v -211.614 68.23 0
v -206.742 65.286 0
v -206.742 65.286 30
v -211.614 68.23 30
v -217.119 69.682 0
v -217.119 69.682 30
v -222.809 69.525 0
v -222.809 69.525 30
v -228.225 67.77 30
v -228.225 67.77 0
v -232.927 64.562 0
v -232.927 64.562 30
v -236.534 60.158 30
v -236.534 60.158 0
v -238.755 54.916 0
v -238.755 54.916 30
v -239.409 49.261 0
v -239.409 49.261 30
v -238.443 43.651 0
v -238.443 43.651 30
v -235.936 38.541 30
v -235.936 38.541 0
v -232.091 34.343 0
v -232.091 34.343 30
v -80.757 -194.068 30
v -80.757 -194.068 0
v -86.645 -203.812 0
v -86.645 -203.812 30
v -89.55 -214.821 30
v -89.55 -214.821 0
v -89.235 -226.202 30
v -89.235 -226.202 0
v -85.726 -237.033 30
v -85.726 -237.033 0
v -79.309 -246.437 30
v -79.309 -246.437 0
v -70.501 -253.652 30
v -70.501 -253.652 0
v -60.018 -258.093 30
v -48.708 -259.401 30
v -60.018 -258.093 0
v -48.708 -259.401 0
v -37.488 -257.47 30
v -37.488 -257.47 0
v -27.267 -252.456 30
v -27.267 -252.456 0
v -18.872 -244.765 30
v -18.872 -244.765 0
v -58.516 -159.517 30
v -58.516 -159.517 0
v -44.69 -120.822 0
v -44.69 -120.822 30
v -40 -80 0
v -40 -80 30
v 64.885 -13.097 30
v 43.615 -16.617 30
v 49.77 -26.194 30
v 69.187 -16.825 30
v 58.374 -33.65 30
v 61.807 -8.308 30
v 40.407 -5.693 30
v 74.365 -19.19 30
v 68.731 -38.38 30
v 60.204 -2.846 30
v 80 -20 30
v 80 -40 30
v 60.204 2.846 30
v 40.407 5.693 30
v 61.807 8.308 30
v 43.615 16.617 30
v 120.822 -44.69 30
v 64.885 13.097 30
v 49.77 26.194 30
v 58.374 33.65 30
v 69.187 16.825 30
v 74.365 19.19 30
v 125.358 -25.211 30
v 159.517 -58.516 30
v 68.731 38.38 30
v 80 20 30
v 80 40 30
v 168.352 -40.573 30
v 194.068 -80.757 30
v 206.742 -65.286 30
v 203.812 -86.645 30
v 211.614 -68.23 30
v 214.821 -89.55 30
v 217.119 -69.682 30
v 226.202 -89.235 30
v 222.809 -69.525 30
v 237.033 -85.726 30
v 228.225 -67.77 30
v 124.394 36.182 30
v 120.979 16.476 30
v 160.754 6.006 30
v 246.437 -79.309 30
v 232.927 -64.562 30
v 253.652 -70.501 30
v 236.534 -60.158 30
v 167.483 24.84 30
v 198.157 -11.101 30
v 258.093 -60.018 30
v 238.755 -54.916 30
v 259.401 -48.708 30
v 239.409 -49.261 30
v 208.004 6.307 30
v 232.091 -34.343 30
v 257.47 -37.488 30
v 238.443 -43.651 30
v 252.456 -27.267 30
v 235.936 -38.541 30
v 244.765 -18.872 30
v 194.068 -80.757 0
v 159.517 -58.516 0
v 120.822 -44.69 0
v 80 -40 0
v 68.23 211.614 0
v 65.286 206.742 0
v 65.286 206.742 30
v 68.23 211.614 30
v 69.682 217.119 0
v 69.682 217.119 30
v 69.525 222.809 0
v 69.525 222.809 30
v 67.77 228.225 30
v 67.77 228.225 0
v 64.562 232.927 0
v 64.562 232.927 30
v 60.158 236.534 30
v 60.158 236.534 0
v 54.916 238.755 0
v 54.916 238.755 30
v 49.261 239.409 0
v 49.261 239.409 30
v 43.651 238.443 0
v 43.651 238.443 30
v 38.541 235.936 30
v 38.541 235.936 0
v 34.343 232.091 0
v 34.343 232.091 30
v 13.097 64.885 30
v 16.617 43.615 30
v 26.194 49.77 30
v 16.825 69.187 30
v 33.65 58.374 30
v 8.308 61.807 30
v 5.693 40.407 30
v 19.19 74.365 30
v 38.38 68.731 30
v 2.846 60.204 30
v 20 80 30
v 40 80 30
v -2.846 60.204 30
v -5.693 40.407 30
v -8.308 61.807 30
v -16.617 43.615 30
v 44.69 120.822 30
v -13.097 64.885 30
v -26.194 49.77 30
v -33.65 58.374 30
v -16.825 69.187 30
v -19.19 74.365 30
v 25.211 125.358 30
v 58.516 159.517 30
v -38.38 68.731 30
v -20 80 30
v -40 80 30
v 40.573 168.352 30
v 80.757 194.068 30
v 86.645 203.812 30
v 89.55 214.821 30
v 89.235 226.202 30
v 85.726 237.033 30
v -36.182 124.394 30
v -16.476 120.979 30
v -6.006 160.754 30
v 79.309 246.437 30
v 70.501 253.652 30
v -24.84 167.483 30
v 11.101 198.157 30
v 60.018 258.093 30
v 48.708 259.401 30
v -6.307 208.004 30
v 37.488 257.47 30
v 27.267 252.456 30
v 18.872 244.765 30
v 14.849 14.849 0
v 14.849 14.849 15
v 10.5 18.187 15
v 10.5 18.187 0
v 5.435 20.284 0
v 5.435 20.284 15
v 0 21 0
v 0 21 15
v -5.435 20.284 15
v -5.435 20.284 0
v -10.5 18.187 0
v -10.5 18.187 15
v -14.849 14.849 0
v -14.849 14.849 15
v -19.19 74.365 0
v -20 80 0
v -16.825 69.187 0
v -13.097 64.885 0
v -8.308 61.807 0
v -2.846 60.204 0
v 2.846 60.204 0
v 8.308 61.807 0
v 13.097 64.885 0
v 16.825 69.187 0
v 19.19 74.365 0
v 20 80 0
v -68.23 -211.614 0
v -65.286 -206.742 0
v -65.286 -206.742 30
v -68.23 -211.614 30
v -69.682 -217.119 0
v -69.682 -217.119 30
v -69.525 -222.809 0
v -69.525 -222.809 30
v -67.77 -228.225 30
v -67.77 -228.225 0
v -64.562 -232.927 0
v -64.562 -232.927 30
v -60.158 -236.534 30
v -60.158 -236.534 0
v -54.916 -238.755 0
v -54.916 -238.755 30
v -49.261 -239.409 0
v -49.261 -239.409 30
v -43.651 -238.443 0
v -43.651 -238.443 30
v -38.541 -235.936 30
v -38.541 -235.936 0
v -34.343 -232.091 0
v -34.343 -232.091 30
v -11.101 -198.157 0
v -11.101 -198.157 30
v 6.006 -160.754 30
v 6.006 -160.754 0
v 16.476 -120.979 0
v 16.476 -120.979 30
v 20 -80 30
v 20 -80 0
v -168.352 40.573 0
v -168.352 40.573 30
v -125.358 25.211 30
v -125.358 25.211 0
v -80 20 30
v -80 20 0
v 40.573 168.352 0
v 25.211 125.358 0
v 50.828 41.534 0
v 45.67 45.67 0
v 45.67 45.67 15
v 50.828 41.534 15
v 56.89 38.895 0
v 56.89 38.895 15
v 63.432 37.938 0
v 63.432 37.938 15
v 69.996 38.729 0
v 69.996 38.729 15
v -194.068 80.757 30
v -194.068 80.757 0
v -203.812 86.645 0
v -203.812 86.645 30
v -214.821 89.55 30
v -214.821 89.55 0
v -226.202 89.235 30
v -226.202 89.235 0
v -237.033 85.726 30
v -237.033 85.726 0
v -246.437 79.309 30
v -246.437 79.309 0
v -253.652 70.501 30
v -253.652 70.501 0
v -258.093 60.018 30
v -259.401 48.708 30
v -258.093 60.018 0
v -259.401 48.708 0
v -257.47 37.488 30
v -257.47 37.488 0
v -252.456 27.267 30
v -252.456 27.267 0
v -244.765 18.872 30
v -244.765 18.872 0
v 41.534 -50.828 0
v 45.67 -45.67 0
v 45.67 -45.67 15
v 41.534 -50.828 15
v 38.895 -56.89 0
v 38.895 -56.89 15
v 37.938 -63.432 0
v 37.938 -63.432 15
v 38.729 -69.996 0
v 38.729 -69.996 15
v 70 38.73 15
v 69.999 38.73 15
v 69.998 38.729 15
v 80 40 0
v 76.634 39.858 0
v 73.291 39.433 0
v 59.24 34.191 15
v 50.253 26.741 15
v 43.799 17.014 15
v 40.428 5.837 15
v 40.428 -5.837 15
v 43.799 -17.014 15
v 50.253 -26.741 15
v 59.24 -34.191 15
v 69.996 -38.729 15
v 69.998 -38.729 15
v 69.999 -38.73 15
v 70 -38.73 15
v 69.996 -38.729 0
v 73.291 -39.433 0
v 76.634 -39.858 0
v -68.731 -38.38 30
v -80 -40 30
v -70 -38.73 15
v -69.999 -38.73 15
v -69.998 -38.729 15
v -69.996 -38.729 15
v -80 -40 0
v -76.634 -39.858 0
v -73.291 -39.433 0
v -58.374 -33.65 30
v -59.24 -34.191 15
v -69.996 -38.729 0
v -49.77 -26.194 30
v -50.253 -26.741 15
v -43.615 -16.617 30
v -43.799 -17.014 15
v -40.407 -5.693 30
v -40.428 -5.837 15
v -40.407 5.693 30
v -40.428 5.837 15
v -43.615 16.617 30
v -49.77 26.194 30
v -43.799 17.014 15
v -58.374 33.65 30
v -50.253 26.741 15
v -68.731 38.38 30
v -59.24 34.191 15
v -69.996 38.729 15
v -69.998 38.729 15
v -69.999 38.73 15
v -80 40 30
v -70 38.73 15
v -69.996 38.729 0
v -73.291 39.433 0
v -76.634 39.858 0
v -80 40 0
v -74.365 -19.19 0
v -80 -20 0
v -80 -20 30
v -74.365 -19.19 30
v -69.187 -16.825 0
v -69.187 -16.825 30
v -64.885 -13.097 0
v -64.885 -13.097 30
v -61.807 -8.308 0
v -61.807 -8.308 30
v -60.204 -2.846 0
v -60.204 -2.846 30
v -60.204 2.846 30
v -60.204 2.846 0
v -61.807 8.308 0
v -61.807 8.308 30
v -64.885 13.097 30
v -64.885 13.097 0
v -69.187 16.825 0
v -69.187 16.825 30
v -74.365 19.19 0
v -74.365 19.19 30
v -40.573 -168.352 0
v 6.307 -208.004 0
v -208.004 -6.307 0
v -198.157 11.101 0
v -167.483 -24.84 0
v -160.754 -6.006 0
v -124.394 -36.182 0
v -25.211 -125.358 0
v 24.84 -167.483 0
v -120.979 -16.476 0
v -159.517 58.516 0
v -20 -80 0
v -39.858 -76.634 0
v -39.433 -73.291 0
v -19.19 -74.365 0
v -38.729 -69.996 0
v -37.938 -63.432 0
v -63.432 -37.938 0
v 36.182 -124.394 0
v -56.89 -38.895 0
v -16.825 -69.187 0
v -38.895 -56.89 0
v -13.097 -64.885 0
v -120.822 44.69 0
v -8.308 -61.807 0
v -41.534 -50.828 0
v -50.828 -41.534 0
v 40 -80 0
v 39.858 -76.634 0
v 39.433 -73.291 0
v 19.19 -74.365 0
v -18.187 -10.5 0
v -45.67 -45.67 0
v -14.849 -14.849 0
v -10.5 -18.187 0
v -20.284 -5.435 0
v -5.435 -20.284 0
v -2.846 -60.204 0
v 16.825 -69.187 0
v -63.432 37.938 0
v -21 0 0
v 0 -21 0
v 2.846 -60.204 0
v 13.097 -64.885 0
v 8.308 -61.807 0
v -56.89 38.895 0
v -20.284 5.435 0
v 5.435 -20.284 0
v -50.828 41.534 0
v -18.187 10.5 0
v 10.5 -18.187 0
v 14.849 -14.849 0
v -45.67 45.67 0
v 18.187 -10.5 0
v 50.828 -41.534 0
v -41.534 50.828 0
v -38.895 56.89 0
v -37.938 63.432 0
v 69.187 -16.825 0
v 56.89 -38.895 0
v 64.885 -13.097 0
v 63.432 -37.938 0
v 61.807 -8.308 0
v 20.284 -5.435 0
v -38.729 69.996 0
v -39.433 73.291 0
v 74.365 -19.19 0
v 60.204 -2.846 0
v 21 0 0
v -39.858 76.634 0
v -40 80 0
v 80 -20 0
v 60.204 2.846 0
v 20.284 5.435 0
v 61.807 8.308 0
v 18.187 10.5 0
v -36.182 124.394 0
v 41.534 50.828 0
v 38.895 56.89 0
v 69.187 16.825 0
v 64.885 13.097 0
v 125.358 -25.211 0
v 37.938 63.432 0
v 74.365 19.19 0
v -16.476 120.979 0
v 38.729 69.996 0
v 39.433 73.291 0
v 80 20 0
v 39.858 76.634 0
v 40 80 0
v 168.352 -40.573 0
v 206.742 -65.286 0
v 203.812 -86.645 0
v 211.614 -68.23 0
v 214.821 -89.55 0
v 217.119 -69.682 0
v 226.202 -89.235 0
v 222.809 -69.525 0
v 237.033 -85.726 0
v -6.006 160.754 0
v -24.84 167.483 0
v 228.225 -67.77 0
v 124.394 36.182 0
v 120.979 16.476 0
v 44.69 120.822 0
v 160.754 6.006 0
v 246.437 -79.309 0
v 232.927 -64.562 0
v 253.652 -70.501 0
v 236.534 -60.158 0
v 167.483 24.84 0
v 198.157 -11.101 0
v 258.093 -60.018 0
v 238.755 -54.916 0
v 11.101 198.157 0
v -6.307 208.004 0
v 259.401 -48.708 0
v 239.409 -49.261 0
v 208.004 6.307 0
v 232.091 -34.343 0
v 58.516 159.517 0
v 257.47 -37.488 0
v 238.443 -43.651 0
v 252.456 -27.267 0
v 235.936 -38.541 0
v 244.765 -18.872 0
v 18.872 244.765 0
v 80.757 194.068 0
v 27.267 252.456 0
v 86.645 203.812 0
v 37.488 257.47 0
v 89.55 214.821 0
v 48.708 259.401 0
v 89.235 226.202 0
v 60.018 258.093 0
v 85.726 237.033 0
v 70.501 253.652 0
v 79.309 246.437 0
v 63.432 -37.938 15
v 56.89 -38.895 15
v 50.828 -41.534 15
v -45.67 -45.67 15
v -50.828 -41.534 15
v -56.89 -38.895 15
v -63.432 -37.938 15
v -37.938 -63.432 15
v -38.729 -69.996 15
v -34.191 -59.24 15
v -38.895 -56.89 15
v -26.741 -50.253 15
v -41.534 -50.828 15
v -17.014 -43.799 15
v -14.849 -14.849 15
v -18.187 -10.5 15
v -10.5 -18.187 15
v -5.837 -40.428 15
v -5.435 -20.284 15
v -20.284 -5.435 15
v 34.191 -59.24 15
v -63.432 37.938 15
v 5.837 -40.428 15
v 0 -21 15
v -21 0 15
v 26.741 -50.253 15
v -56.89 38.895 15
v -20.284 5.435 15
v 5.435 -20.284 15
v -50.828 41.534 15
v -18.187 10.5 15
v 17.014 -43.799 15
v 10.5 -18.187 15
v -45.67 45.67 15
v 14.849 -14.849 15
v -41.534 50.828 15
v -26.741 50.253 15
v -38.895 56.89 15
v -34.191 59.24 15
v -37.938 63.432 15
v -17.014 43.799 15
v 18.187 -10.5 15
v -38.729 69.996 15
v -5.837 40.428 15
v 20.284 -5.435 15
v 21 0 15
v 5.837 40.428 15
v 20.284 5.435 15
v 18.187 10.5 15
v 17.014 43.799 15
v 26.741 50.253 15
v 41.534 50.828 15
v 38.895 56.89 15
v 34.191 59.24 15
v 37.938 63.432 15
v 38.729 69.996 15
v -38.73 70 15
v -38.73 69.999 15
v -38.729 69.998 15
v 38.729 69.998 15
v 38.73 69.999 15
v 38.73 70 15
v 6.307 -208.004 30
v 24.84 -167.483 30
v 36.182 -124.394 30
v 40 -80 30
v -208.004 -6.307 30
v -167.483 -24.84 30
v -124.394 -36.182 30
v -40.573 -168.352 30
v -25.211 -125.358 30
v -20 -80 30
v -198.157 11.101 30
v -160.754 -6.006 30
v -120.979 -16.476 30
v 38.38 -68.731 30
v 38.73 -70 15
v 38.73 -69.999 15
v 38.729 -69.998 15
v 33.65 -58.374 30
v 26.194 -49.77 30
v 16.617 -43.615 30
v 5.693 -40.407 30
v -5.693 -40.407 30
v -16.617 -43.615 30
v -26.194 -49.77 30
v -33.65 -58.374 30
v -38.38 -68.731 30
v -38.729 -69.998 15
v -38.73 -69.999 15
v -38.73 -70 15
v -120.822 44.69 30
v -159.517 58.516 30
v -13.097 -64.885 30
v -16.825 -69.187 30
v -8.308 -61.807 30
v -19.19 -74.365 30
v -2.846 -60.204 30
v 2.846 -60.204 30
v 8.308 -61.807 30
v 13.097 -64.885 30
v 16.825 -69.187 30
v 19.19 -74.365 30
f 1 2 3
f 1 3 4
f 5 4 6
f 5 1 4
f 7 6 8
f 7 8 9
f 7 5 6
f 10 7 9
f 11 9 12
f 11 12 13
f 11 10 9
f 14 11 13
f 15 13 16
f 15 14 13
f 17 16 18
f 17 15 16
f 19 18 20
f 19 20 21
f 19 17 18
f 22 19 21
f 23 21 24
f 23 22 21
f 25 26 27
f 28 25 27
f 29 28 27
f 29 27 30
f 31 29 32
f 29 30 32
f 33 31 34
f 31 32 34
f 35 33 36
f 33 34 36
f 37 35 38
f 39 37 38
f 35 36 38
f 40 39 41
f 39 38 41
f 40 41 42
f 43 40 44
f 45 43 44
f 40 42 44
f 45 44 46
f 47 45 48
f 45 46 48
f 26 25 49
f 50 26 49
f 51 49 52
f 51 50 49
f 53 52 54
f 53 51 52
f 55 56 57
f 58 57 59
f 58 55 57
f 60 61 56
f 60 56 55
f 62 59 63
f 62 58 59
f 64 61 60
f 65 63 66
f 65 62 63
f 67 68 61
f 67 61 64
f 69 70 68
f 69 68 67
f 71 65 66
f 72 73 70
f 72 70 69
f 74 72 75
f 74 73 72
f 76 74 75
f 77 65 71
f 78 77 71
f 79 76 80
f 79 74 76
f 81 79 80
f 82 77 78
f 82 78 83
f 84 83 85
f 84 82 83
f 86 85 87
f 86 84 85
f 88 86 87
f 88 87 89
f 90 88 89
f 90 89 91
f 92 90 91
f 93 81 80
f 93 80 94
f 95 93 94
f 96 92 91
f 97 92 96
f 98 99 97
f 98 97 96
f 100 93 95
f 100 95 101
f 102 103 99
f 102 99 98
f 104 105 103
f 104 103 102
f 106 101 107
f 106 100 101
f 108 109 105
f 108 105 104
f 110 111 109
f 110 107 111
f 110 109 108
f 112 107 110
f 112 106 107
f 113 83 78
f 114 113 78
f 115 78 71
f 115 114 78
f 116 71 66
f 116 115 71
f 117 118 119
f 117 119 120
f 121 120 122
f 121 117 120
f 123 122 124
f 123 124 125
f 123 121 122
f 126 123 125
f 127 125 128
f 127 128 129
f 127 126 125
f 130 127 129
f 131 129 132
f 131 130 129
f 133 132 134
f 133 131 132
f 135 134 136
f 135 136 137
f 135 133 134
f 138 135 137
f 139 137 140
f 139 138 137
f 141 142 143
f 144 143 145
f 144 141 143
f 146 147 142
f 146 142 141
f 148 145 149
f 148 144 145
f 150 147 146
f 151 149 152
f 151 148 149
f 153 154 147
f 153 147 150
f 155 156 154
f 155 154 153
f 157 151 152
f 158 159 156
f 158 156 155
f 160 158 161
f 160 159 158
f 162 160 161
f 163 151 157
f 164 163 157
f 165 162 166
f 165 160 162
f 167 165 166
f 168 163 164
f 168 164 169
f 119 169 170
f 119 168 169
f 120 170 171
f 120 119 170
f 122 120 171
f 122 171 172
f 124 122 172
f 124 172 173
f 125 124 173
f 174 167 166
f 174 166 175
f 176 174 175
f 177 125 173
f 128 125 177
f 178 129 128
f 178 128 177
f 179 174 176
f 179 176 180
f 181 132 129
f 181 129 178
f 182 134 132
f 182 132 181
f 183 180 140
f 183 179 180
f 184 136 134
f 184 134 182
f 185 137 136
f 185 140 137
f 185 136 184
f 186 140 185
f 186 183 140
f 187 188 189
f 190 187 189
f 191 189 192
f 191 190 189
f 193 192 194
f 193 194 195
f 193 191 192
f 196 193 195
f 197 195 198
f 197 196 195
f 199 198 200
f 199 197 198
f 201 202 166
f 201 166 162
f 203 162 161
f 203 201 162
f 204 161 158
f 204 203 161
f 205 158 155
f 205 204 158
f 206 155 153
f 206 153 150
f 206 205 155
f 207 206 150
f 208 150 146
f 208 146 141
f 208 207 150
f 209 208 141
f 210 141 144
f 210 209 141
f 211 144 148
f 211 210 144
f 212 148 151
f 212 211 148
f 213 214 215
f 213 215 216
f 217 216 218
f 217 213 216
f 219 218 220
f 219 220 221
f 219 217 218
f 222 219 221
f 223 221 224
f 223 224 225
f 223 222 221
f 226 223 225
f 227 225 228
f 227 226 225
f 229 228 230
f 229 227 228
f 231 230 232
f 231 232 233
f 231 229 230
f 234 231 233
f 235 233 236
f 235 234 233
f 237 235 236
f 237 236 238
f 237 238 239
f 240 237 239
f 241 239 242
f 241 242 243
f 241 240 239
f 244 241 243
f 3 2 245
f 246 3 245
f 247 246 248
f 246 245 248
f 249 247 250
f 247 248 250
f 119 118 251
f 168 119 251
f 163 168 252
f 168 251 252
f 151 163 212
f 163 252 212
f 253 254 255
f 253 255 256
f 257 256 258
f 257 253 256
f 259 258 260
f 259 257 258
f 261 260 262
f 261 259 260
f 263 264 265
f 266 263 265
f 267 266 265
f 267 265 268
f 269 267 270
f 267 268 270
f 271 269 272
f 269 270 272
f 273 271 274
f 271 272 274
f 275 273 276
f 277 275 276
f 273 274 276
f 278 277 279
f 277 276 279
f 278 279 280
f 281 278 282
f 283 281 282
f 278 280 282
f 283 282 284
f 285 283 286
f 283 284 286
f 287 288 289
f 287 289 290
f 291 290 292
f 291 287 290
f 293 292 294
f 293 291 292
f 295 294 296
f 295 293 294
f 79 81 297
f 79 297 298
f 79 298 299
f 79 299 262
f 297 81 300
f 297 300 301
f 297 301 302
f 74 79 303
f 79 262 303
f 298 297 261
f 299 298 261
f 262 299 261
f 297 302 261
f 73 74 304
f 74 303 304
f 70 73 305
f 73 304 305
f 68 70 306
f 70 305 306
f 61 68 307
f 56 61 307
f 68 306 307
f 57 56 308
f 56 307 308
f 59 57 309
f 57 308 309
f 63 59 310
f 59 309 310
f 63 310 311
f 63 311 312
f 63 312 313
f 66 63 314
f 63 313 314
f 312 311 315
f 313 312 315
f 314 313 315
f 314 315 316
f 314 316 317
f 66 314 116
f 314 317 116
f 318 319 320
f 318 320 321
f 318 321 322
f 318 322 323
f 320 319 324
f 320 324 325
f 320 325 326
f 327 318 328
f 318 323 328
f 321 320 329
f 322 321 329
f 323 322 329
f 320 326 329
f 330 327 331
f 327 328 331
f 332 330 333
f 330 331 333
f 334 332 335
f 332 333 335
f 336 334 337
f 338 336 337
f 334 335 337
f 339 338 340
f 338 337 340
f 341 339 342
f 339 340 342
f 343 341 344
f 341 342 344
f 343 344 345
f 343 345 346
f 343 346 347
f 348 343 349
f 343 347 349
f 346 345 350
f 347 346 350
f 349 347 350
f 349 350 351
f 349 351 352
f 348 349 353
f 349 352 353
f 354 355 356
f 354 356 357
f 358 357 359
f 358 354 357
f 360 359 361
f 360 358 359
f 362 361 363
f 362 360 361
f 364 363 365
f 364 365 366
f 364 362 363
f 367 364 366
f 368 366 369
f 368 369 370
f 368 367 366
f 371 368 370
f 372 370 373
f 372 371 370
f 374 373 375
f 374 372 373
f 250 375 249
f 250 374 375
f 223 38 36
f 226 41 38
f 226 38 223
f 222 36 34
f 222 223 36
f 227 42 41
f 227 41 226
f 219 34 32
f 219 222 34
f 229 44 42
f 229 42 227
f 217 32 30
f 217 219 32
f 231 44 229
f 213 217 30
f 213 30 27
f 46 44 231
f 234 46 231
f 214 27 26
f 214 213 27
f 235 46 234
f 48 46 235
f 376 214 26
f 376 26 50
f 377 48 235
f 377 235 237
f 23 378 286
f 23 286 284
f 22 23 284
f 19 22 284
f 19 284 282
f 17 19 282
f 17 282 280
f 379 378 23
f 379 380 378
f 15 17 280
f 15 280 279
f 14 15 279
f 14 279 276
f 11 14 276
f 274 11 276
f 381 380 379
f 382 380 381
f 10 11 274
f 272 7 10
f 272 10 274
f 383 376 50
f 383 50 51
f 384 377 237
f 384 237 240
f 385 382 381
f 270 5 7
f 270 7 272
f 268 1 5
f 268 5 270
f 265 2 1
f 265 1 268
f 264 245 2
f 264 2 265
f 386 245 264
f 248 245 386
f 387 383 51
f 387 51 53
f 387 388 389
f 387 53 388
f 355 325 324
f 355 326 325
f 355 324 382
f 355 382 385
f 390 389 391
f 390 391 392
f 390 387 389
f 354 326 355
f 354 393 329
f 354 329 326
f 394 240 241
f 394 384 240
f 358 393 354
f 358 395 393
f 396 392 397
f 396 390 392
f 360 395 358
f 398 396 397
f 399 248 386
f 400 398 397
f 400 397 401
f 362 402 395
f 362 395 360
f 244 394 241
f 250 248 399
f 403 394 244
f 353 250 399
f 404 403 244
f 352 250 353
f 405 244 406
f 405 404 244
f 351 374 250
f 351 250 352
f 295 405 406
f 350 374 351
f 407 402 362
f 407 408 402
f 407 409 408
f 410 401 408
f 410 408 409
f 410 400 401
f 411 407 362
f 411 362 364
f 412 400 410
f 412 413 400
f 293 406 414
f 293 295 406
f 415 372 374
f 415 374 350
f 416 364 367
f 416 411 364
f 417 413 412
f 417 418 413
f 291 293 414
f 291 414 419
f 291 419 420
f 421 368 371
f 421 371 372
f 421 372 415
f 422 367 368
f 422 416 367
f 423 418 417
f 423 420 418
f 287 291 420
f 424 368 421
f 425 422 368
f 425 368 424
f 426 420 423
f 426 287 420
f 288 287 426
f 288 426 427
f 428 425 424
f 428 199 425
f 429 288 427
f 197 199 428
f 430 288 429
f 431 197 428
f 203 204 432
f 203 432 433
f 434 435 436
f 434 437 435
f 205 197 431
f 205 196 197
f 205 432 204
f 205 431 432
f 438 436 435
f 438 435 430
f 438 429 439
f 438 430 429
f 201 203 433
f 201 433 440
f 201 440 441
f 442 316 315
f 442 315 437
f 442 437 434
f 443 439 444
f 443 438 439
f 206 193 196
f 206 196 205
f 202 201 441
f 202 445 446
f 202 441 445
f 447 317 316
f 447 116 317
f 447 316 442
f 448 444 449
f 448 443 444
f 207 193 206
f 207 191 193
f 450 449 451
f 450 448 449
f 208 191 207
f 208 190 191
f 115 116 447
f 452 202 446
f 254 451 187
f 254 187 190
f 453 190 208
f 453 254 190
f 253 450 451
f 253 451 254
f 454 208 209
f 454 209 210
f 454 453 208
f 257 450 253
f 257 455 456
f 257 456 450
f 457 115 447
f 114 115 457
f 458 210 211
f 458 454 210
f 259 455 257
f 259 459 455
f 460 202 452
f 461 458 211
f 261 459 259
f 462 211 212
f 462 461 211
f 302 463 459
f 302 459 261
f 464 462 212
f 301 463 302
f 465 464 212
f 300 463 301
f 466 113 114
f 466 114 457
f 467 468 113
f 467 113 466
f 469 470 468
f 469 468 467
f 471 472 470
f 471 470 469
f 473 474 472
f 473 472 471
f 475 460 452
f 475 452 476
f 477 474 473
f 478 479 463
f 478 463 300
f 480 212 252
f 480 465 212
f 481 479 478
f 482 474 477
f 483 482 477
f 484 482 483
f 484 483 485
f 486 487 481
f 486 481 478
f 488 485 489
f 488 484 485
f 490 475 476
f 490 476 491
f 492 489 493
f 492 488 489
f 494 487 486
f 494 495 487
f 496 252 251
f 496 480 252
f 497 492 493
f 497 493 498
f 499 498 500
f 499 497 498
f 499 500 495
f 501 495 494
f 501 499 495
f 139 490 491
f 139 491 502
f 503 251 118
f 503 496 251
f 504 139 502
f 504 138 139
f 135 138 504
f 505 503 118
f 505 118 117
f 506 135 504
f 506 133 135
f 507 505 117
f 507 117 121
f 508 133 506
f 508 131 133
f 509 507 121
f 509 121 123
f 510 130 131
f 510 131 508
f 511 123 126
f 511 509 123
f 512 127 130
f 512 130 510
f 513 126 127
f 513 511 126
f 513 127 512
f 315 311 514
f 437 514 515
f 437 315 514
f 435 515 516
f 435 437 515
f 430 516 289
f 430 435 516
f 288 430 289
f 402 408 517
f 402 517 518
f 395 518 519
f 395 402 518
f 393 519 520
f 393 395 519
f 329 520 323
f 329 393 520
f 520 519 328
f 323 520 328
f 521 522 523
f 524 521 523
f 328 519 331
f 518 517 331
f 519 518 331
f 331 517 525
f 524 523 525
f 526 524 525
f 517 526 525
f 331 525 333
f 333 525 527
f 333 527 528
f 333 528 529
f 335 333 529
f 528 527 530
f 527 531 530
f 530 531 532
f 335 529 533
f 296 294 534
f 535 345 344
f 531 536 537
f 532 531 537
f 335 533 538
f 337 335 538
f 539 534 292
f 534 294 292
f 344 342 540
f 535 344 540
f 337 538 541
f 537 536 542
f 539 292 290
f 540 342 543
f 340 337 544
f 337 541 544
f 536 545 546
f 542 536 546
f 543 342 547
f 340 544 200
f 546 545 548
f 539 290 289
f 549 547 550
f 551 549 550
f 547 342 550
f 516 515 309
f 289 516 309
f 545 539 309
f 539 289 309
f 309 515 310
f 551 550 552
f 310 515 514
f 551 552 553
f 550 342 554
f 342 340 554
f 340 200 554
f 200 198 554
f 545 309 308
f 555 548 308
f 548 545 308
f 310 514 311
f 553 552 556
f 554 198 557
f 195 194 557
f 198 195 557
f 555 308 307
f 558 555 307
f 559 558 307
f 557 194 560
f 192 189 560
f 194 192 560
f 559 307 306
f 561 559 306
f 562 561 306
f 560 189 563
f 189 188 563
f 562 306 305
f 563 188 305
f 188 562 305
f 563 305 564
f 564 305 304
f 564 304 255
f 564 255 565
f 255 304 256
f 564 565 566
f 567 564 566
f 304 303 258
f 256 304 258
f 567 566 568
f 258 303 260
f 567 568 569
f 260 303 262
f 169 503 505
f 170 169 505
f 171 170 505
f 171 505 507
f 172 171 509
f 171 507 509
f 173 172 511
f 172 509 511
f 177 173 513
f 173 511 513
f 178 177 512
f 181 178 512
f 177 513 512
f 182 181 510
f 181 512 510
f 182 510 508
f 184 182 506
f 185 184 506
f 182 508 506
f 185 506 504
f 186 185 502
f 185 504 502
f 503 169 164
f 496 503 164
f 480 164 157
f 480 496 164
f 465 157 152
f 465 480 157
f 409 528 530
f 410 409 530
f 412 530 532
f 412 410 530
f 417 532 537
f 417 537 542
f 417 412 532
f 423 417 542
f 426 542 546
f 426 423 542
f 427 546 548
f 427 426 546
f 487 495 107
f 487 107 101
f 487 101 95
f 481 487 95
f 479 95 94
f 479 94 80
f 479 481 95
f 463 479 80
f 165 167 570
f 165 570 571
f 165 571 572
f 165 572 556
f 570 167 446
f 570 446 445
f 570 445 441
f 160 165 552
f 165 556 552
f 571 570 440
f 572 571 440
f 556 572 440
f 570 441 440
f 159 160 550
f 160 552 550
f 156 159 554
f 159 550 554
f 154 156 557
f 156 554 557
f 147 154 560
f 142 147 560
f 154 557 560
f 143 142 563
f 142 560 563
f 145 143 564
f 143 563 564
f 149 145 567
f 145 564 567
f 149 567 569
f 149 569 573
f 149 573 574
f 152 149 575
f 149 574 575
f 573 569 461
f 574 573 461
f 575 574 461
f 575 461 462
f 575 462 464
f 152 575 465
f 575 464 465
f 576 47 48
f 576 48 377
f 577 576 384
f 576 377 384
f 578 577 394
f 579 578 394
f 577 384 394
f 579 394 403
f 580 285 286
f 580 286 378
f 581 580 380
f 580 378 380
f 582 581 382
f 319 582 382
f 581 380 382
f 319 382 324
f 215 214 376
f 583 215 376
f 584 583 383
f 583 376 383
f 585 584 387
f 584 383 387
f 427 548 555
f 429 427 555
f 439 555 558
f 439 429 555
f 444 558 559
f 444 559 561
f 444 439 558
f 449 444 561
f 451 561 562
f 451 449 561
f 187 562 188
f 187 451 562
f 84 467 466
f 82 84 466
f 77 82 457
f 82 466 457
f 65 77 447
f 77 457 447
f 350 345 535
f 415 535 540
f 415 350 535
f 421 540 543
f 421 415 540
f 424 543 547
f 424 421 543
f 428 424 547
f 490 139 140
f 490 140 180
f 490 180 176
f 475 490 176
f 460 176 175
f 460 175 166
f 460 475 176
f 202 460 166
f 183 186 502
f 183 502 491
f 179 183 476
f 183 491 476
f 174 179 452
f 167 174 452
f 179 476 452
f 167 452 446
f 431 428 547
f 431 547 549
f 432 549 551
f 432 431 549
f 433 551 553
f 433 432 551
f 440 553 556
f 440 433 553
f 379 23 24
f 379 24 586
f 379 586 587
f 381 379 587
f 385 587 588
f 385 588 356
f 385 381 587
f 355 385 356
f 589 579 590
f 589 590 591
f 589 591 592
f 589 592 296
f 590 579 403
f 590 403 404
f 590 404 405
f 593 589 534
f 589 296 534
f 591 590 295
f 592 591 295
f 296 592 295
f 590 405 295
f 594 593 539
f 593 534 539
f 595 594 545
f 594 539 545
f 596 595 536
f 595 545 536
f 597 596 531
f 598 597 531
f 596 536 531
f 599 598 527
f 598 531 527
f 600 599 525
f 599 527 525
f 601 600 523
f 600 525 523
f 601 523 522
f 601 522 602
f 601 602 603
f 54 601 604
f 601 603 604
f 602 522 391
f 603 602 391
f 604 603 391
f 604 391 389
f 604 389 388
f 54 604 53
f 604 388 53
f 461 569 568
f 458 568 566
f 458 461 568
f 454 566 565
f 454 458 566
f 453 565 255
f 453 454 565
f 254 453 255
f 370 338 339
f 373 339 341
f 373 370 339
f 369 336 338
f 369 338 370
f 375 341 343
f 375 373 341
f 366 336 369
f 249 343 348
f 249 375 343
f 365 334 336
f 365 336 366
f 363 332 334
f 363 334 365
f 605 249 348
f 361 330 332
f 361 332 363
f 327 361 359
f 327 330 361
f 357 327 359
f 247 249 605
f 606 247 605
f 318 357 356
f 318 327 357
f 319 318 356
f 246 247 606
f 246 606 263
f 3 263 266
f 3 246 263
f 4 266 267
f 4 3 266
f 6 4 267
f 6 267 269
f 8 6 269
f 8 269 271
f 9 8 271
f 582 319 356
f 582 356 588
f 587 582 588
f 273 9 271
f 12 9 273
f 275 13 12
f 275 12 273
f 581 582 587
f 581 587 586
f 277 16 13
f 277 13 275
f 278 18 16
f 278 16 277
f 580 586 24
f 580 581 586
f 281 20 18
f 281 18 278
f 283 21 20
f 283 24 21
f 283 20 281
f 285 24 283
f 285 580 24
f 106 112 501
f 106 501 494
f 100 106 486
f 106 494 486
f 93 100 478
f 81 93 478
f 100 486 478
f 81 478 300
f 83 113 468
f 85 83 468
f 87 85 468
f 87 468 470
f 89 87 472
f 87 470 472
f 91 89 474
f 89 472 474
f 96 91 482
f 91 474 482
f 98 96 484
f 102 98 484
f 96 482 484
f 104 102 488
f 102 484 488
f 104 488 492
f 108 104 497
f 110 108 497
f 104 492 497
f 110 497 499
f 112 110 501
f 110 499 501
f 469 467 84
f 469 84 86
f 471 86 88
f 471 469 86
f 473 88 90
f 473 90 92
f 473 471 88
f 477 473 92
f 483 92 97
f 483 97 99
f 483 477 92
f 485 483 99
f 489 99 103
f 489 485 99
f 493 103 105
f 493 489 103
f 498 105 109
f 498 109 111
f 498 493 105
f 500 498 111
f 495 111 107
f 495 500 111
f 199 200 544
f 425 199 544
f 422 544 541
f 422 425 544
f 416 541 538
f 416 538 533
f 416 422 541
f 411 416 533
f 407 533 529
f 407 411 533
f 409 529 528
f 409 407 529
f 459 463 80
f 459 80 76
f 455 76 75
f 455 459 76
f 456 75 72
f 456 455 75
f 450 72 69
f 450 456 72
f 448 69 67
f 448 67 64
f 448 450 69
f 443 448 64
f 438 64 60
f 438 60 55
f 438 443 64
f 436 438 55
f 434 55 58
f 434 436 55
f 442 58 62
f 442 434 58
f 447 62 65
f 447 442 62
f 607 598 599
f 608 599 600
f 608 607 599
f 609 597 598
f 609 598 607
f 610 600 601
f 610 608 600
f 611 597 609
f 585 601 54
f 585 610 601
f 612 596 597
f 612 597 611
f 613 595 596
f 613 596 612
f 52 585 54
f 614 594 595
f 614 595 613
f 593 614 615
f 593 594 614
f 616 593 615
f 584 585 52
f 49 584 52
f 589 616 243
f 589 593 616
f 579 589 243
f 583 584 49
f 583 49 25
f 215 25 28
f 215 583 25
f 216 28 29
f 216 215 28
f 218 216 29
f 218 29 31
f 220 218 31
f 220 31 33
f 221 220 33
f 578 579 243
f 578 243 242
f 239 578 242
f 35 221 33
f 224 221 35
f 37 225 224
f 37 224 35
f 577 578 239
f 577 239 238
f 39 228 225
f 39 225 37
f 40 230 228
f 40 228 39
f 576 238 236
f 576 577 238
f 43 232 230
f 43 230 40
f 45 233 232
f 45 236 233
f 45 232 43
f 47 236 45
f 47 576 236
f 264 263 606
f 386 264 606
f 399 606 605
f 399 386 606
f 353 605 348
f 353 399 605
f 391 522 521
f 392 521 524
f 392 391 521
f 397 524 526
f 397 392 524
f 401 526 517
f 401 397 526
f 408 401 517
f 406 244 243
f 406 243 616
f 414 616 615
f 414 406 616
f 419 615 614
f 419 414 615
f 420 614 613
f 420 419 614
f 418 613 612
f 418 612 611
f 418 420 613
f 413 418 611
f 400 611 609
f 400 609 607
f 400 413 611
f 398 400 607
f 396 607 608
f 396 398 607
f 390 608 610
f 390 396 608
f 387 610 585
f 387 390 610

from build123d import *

# Parameters (mm, degrees)
PAD_DEPTH          = 30
PAD001_DEPTH       = 15
POLARPATTERN_COUNT = 4


with BuildPart() as part:
    # Sketch (on XY_Plane of Origin) → Pad (new body)
    with BuildSketch(Plane.XY):
        with BuildLine():
            ThreePointArc((244.764719, -18.871714), (167.483272, 24.840105), (80, 40))
            ThreePointArc((80, 40), (40, 0), (80, -40))
            ThreePointArc((194.067882, -80.75734), (140.565342, -50.495312), (80, -40))
            ThreePointArc((194.067882, -80.75734), (250.359114, -75.162945), (244.764719, -18.871714))
        make_face()
        with BuildLine():
            ThreePointArc((206.742091, -65.285934), (147.294824, -31.661457), (80, -20))
            ThreePointArc((80, 20), (60, 0), (80, -20))
            ThreePointArc((232.09051, -34.34312), (160.753789, 6.006251), (80, 20))
            ThreePointArc((206.742091, -65.285934), (234.887707, -62.488736), (232.09051, -34.34312))
        make_face(mode=Mode.SUBTRACT)
    extrude(amount=PAD_DEPTH)

    # Sketch001 (on XY_Plane of Origin) → Pad001 (join)
    with BuildSketch(Plane.XY):
        with BuildLine():
            ThreePointArc((14.849242, -14.849242), (21, 0), (14.849242, 14.849242))
            Line((14.849242, 14.849242), (45.670006, 45.670006))
            ThreePointArc((45.670006, 45.670006), (56.892253, 38.894945), (70, 38.729833))
            ThreePointArc((70, 38.729833), (40, 0), (70, -38.729833))
            ThreePointArc((70, -38.729833), (56.892253, -38.894945), (45.670006, -45.670006))
            Line((45.670006, -45.670006), (14.849242, -14.849242))
        make_face()
    extrude(amount=PAD001_DEPTH)

    # PolarPattern: part ×4 about axis
    polarpattern_axis = Axis((0, 0, 0), (0, 0, 1))


with BuildPart() as part_1:
    add(part.part)
    for i in range(1, POLARPATTERN_COUNT):
        add(part.part.rotate(polarpattern_axis, i * 360 / POLARPATTERN_COUNT))


solid = part_1.part
